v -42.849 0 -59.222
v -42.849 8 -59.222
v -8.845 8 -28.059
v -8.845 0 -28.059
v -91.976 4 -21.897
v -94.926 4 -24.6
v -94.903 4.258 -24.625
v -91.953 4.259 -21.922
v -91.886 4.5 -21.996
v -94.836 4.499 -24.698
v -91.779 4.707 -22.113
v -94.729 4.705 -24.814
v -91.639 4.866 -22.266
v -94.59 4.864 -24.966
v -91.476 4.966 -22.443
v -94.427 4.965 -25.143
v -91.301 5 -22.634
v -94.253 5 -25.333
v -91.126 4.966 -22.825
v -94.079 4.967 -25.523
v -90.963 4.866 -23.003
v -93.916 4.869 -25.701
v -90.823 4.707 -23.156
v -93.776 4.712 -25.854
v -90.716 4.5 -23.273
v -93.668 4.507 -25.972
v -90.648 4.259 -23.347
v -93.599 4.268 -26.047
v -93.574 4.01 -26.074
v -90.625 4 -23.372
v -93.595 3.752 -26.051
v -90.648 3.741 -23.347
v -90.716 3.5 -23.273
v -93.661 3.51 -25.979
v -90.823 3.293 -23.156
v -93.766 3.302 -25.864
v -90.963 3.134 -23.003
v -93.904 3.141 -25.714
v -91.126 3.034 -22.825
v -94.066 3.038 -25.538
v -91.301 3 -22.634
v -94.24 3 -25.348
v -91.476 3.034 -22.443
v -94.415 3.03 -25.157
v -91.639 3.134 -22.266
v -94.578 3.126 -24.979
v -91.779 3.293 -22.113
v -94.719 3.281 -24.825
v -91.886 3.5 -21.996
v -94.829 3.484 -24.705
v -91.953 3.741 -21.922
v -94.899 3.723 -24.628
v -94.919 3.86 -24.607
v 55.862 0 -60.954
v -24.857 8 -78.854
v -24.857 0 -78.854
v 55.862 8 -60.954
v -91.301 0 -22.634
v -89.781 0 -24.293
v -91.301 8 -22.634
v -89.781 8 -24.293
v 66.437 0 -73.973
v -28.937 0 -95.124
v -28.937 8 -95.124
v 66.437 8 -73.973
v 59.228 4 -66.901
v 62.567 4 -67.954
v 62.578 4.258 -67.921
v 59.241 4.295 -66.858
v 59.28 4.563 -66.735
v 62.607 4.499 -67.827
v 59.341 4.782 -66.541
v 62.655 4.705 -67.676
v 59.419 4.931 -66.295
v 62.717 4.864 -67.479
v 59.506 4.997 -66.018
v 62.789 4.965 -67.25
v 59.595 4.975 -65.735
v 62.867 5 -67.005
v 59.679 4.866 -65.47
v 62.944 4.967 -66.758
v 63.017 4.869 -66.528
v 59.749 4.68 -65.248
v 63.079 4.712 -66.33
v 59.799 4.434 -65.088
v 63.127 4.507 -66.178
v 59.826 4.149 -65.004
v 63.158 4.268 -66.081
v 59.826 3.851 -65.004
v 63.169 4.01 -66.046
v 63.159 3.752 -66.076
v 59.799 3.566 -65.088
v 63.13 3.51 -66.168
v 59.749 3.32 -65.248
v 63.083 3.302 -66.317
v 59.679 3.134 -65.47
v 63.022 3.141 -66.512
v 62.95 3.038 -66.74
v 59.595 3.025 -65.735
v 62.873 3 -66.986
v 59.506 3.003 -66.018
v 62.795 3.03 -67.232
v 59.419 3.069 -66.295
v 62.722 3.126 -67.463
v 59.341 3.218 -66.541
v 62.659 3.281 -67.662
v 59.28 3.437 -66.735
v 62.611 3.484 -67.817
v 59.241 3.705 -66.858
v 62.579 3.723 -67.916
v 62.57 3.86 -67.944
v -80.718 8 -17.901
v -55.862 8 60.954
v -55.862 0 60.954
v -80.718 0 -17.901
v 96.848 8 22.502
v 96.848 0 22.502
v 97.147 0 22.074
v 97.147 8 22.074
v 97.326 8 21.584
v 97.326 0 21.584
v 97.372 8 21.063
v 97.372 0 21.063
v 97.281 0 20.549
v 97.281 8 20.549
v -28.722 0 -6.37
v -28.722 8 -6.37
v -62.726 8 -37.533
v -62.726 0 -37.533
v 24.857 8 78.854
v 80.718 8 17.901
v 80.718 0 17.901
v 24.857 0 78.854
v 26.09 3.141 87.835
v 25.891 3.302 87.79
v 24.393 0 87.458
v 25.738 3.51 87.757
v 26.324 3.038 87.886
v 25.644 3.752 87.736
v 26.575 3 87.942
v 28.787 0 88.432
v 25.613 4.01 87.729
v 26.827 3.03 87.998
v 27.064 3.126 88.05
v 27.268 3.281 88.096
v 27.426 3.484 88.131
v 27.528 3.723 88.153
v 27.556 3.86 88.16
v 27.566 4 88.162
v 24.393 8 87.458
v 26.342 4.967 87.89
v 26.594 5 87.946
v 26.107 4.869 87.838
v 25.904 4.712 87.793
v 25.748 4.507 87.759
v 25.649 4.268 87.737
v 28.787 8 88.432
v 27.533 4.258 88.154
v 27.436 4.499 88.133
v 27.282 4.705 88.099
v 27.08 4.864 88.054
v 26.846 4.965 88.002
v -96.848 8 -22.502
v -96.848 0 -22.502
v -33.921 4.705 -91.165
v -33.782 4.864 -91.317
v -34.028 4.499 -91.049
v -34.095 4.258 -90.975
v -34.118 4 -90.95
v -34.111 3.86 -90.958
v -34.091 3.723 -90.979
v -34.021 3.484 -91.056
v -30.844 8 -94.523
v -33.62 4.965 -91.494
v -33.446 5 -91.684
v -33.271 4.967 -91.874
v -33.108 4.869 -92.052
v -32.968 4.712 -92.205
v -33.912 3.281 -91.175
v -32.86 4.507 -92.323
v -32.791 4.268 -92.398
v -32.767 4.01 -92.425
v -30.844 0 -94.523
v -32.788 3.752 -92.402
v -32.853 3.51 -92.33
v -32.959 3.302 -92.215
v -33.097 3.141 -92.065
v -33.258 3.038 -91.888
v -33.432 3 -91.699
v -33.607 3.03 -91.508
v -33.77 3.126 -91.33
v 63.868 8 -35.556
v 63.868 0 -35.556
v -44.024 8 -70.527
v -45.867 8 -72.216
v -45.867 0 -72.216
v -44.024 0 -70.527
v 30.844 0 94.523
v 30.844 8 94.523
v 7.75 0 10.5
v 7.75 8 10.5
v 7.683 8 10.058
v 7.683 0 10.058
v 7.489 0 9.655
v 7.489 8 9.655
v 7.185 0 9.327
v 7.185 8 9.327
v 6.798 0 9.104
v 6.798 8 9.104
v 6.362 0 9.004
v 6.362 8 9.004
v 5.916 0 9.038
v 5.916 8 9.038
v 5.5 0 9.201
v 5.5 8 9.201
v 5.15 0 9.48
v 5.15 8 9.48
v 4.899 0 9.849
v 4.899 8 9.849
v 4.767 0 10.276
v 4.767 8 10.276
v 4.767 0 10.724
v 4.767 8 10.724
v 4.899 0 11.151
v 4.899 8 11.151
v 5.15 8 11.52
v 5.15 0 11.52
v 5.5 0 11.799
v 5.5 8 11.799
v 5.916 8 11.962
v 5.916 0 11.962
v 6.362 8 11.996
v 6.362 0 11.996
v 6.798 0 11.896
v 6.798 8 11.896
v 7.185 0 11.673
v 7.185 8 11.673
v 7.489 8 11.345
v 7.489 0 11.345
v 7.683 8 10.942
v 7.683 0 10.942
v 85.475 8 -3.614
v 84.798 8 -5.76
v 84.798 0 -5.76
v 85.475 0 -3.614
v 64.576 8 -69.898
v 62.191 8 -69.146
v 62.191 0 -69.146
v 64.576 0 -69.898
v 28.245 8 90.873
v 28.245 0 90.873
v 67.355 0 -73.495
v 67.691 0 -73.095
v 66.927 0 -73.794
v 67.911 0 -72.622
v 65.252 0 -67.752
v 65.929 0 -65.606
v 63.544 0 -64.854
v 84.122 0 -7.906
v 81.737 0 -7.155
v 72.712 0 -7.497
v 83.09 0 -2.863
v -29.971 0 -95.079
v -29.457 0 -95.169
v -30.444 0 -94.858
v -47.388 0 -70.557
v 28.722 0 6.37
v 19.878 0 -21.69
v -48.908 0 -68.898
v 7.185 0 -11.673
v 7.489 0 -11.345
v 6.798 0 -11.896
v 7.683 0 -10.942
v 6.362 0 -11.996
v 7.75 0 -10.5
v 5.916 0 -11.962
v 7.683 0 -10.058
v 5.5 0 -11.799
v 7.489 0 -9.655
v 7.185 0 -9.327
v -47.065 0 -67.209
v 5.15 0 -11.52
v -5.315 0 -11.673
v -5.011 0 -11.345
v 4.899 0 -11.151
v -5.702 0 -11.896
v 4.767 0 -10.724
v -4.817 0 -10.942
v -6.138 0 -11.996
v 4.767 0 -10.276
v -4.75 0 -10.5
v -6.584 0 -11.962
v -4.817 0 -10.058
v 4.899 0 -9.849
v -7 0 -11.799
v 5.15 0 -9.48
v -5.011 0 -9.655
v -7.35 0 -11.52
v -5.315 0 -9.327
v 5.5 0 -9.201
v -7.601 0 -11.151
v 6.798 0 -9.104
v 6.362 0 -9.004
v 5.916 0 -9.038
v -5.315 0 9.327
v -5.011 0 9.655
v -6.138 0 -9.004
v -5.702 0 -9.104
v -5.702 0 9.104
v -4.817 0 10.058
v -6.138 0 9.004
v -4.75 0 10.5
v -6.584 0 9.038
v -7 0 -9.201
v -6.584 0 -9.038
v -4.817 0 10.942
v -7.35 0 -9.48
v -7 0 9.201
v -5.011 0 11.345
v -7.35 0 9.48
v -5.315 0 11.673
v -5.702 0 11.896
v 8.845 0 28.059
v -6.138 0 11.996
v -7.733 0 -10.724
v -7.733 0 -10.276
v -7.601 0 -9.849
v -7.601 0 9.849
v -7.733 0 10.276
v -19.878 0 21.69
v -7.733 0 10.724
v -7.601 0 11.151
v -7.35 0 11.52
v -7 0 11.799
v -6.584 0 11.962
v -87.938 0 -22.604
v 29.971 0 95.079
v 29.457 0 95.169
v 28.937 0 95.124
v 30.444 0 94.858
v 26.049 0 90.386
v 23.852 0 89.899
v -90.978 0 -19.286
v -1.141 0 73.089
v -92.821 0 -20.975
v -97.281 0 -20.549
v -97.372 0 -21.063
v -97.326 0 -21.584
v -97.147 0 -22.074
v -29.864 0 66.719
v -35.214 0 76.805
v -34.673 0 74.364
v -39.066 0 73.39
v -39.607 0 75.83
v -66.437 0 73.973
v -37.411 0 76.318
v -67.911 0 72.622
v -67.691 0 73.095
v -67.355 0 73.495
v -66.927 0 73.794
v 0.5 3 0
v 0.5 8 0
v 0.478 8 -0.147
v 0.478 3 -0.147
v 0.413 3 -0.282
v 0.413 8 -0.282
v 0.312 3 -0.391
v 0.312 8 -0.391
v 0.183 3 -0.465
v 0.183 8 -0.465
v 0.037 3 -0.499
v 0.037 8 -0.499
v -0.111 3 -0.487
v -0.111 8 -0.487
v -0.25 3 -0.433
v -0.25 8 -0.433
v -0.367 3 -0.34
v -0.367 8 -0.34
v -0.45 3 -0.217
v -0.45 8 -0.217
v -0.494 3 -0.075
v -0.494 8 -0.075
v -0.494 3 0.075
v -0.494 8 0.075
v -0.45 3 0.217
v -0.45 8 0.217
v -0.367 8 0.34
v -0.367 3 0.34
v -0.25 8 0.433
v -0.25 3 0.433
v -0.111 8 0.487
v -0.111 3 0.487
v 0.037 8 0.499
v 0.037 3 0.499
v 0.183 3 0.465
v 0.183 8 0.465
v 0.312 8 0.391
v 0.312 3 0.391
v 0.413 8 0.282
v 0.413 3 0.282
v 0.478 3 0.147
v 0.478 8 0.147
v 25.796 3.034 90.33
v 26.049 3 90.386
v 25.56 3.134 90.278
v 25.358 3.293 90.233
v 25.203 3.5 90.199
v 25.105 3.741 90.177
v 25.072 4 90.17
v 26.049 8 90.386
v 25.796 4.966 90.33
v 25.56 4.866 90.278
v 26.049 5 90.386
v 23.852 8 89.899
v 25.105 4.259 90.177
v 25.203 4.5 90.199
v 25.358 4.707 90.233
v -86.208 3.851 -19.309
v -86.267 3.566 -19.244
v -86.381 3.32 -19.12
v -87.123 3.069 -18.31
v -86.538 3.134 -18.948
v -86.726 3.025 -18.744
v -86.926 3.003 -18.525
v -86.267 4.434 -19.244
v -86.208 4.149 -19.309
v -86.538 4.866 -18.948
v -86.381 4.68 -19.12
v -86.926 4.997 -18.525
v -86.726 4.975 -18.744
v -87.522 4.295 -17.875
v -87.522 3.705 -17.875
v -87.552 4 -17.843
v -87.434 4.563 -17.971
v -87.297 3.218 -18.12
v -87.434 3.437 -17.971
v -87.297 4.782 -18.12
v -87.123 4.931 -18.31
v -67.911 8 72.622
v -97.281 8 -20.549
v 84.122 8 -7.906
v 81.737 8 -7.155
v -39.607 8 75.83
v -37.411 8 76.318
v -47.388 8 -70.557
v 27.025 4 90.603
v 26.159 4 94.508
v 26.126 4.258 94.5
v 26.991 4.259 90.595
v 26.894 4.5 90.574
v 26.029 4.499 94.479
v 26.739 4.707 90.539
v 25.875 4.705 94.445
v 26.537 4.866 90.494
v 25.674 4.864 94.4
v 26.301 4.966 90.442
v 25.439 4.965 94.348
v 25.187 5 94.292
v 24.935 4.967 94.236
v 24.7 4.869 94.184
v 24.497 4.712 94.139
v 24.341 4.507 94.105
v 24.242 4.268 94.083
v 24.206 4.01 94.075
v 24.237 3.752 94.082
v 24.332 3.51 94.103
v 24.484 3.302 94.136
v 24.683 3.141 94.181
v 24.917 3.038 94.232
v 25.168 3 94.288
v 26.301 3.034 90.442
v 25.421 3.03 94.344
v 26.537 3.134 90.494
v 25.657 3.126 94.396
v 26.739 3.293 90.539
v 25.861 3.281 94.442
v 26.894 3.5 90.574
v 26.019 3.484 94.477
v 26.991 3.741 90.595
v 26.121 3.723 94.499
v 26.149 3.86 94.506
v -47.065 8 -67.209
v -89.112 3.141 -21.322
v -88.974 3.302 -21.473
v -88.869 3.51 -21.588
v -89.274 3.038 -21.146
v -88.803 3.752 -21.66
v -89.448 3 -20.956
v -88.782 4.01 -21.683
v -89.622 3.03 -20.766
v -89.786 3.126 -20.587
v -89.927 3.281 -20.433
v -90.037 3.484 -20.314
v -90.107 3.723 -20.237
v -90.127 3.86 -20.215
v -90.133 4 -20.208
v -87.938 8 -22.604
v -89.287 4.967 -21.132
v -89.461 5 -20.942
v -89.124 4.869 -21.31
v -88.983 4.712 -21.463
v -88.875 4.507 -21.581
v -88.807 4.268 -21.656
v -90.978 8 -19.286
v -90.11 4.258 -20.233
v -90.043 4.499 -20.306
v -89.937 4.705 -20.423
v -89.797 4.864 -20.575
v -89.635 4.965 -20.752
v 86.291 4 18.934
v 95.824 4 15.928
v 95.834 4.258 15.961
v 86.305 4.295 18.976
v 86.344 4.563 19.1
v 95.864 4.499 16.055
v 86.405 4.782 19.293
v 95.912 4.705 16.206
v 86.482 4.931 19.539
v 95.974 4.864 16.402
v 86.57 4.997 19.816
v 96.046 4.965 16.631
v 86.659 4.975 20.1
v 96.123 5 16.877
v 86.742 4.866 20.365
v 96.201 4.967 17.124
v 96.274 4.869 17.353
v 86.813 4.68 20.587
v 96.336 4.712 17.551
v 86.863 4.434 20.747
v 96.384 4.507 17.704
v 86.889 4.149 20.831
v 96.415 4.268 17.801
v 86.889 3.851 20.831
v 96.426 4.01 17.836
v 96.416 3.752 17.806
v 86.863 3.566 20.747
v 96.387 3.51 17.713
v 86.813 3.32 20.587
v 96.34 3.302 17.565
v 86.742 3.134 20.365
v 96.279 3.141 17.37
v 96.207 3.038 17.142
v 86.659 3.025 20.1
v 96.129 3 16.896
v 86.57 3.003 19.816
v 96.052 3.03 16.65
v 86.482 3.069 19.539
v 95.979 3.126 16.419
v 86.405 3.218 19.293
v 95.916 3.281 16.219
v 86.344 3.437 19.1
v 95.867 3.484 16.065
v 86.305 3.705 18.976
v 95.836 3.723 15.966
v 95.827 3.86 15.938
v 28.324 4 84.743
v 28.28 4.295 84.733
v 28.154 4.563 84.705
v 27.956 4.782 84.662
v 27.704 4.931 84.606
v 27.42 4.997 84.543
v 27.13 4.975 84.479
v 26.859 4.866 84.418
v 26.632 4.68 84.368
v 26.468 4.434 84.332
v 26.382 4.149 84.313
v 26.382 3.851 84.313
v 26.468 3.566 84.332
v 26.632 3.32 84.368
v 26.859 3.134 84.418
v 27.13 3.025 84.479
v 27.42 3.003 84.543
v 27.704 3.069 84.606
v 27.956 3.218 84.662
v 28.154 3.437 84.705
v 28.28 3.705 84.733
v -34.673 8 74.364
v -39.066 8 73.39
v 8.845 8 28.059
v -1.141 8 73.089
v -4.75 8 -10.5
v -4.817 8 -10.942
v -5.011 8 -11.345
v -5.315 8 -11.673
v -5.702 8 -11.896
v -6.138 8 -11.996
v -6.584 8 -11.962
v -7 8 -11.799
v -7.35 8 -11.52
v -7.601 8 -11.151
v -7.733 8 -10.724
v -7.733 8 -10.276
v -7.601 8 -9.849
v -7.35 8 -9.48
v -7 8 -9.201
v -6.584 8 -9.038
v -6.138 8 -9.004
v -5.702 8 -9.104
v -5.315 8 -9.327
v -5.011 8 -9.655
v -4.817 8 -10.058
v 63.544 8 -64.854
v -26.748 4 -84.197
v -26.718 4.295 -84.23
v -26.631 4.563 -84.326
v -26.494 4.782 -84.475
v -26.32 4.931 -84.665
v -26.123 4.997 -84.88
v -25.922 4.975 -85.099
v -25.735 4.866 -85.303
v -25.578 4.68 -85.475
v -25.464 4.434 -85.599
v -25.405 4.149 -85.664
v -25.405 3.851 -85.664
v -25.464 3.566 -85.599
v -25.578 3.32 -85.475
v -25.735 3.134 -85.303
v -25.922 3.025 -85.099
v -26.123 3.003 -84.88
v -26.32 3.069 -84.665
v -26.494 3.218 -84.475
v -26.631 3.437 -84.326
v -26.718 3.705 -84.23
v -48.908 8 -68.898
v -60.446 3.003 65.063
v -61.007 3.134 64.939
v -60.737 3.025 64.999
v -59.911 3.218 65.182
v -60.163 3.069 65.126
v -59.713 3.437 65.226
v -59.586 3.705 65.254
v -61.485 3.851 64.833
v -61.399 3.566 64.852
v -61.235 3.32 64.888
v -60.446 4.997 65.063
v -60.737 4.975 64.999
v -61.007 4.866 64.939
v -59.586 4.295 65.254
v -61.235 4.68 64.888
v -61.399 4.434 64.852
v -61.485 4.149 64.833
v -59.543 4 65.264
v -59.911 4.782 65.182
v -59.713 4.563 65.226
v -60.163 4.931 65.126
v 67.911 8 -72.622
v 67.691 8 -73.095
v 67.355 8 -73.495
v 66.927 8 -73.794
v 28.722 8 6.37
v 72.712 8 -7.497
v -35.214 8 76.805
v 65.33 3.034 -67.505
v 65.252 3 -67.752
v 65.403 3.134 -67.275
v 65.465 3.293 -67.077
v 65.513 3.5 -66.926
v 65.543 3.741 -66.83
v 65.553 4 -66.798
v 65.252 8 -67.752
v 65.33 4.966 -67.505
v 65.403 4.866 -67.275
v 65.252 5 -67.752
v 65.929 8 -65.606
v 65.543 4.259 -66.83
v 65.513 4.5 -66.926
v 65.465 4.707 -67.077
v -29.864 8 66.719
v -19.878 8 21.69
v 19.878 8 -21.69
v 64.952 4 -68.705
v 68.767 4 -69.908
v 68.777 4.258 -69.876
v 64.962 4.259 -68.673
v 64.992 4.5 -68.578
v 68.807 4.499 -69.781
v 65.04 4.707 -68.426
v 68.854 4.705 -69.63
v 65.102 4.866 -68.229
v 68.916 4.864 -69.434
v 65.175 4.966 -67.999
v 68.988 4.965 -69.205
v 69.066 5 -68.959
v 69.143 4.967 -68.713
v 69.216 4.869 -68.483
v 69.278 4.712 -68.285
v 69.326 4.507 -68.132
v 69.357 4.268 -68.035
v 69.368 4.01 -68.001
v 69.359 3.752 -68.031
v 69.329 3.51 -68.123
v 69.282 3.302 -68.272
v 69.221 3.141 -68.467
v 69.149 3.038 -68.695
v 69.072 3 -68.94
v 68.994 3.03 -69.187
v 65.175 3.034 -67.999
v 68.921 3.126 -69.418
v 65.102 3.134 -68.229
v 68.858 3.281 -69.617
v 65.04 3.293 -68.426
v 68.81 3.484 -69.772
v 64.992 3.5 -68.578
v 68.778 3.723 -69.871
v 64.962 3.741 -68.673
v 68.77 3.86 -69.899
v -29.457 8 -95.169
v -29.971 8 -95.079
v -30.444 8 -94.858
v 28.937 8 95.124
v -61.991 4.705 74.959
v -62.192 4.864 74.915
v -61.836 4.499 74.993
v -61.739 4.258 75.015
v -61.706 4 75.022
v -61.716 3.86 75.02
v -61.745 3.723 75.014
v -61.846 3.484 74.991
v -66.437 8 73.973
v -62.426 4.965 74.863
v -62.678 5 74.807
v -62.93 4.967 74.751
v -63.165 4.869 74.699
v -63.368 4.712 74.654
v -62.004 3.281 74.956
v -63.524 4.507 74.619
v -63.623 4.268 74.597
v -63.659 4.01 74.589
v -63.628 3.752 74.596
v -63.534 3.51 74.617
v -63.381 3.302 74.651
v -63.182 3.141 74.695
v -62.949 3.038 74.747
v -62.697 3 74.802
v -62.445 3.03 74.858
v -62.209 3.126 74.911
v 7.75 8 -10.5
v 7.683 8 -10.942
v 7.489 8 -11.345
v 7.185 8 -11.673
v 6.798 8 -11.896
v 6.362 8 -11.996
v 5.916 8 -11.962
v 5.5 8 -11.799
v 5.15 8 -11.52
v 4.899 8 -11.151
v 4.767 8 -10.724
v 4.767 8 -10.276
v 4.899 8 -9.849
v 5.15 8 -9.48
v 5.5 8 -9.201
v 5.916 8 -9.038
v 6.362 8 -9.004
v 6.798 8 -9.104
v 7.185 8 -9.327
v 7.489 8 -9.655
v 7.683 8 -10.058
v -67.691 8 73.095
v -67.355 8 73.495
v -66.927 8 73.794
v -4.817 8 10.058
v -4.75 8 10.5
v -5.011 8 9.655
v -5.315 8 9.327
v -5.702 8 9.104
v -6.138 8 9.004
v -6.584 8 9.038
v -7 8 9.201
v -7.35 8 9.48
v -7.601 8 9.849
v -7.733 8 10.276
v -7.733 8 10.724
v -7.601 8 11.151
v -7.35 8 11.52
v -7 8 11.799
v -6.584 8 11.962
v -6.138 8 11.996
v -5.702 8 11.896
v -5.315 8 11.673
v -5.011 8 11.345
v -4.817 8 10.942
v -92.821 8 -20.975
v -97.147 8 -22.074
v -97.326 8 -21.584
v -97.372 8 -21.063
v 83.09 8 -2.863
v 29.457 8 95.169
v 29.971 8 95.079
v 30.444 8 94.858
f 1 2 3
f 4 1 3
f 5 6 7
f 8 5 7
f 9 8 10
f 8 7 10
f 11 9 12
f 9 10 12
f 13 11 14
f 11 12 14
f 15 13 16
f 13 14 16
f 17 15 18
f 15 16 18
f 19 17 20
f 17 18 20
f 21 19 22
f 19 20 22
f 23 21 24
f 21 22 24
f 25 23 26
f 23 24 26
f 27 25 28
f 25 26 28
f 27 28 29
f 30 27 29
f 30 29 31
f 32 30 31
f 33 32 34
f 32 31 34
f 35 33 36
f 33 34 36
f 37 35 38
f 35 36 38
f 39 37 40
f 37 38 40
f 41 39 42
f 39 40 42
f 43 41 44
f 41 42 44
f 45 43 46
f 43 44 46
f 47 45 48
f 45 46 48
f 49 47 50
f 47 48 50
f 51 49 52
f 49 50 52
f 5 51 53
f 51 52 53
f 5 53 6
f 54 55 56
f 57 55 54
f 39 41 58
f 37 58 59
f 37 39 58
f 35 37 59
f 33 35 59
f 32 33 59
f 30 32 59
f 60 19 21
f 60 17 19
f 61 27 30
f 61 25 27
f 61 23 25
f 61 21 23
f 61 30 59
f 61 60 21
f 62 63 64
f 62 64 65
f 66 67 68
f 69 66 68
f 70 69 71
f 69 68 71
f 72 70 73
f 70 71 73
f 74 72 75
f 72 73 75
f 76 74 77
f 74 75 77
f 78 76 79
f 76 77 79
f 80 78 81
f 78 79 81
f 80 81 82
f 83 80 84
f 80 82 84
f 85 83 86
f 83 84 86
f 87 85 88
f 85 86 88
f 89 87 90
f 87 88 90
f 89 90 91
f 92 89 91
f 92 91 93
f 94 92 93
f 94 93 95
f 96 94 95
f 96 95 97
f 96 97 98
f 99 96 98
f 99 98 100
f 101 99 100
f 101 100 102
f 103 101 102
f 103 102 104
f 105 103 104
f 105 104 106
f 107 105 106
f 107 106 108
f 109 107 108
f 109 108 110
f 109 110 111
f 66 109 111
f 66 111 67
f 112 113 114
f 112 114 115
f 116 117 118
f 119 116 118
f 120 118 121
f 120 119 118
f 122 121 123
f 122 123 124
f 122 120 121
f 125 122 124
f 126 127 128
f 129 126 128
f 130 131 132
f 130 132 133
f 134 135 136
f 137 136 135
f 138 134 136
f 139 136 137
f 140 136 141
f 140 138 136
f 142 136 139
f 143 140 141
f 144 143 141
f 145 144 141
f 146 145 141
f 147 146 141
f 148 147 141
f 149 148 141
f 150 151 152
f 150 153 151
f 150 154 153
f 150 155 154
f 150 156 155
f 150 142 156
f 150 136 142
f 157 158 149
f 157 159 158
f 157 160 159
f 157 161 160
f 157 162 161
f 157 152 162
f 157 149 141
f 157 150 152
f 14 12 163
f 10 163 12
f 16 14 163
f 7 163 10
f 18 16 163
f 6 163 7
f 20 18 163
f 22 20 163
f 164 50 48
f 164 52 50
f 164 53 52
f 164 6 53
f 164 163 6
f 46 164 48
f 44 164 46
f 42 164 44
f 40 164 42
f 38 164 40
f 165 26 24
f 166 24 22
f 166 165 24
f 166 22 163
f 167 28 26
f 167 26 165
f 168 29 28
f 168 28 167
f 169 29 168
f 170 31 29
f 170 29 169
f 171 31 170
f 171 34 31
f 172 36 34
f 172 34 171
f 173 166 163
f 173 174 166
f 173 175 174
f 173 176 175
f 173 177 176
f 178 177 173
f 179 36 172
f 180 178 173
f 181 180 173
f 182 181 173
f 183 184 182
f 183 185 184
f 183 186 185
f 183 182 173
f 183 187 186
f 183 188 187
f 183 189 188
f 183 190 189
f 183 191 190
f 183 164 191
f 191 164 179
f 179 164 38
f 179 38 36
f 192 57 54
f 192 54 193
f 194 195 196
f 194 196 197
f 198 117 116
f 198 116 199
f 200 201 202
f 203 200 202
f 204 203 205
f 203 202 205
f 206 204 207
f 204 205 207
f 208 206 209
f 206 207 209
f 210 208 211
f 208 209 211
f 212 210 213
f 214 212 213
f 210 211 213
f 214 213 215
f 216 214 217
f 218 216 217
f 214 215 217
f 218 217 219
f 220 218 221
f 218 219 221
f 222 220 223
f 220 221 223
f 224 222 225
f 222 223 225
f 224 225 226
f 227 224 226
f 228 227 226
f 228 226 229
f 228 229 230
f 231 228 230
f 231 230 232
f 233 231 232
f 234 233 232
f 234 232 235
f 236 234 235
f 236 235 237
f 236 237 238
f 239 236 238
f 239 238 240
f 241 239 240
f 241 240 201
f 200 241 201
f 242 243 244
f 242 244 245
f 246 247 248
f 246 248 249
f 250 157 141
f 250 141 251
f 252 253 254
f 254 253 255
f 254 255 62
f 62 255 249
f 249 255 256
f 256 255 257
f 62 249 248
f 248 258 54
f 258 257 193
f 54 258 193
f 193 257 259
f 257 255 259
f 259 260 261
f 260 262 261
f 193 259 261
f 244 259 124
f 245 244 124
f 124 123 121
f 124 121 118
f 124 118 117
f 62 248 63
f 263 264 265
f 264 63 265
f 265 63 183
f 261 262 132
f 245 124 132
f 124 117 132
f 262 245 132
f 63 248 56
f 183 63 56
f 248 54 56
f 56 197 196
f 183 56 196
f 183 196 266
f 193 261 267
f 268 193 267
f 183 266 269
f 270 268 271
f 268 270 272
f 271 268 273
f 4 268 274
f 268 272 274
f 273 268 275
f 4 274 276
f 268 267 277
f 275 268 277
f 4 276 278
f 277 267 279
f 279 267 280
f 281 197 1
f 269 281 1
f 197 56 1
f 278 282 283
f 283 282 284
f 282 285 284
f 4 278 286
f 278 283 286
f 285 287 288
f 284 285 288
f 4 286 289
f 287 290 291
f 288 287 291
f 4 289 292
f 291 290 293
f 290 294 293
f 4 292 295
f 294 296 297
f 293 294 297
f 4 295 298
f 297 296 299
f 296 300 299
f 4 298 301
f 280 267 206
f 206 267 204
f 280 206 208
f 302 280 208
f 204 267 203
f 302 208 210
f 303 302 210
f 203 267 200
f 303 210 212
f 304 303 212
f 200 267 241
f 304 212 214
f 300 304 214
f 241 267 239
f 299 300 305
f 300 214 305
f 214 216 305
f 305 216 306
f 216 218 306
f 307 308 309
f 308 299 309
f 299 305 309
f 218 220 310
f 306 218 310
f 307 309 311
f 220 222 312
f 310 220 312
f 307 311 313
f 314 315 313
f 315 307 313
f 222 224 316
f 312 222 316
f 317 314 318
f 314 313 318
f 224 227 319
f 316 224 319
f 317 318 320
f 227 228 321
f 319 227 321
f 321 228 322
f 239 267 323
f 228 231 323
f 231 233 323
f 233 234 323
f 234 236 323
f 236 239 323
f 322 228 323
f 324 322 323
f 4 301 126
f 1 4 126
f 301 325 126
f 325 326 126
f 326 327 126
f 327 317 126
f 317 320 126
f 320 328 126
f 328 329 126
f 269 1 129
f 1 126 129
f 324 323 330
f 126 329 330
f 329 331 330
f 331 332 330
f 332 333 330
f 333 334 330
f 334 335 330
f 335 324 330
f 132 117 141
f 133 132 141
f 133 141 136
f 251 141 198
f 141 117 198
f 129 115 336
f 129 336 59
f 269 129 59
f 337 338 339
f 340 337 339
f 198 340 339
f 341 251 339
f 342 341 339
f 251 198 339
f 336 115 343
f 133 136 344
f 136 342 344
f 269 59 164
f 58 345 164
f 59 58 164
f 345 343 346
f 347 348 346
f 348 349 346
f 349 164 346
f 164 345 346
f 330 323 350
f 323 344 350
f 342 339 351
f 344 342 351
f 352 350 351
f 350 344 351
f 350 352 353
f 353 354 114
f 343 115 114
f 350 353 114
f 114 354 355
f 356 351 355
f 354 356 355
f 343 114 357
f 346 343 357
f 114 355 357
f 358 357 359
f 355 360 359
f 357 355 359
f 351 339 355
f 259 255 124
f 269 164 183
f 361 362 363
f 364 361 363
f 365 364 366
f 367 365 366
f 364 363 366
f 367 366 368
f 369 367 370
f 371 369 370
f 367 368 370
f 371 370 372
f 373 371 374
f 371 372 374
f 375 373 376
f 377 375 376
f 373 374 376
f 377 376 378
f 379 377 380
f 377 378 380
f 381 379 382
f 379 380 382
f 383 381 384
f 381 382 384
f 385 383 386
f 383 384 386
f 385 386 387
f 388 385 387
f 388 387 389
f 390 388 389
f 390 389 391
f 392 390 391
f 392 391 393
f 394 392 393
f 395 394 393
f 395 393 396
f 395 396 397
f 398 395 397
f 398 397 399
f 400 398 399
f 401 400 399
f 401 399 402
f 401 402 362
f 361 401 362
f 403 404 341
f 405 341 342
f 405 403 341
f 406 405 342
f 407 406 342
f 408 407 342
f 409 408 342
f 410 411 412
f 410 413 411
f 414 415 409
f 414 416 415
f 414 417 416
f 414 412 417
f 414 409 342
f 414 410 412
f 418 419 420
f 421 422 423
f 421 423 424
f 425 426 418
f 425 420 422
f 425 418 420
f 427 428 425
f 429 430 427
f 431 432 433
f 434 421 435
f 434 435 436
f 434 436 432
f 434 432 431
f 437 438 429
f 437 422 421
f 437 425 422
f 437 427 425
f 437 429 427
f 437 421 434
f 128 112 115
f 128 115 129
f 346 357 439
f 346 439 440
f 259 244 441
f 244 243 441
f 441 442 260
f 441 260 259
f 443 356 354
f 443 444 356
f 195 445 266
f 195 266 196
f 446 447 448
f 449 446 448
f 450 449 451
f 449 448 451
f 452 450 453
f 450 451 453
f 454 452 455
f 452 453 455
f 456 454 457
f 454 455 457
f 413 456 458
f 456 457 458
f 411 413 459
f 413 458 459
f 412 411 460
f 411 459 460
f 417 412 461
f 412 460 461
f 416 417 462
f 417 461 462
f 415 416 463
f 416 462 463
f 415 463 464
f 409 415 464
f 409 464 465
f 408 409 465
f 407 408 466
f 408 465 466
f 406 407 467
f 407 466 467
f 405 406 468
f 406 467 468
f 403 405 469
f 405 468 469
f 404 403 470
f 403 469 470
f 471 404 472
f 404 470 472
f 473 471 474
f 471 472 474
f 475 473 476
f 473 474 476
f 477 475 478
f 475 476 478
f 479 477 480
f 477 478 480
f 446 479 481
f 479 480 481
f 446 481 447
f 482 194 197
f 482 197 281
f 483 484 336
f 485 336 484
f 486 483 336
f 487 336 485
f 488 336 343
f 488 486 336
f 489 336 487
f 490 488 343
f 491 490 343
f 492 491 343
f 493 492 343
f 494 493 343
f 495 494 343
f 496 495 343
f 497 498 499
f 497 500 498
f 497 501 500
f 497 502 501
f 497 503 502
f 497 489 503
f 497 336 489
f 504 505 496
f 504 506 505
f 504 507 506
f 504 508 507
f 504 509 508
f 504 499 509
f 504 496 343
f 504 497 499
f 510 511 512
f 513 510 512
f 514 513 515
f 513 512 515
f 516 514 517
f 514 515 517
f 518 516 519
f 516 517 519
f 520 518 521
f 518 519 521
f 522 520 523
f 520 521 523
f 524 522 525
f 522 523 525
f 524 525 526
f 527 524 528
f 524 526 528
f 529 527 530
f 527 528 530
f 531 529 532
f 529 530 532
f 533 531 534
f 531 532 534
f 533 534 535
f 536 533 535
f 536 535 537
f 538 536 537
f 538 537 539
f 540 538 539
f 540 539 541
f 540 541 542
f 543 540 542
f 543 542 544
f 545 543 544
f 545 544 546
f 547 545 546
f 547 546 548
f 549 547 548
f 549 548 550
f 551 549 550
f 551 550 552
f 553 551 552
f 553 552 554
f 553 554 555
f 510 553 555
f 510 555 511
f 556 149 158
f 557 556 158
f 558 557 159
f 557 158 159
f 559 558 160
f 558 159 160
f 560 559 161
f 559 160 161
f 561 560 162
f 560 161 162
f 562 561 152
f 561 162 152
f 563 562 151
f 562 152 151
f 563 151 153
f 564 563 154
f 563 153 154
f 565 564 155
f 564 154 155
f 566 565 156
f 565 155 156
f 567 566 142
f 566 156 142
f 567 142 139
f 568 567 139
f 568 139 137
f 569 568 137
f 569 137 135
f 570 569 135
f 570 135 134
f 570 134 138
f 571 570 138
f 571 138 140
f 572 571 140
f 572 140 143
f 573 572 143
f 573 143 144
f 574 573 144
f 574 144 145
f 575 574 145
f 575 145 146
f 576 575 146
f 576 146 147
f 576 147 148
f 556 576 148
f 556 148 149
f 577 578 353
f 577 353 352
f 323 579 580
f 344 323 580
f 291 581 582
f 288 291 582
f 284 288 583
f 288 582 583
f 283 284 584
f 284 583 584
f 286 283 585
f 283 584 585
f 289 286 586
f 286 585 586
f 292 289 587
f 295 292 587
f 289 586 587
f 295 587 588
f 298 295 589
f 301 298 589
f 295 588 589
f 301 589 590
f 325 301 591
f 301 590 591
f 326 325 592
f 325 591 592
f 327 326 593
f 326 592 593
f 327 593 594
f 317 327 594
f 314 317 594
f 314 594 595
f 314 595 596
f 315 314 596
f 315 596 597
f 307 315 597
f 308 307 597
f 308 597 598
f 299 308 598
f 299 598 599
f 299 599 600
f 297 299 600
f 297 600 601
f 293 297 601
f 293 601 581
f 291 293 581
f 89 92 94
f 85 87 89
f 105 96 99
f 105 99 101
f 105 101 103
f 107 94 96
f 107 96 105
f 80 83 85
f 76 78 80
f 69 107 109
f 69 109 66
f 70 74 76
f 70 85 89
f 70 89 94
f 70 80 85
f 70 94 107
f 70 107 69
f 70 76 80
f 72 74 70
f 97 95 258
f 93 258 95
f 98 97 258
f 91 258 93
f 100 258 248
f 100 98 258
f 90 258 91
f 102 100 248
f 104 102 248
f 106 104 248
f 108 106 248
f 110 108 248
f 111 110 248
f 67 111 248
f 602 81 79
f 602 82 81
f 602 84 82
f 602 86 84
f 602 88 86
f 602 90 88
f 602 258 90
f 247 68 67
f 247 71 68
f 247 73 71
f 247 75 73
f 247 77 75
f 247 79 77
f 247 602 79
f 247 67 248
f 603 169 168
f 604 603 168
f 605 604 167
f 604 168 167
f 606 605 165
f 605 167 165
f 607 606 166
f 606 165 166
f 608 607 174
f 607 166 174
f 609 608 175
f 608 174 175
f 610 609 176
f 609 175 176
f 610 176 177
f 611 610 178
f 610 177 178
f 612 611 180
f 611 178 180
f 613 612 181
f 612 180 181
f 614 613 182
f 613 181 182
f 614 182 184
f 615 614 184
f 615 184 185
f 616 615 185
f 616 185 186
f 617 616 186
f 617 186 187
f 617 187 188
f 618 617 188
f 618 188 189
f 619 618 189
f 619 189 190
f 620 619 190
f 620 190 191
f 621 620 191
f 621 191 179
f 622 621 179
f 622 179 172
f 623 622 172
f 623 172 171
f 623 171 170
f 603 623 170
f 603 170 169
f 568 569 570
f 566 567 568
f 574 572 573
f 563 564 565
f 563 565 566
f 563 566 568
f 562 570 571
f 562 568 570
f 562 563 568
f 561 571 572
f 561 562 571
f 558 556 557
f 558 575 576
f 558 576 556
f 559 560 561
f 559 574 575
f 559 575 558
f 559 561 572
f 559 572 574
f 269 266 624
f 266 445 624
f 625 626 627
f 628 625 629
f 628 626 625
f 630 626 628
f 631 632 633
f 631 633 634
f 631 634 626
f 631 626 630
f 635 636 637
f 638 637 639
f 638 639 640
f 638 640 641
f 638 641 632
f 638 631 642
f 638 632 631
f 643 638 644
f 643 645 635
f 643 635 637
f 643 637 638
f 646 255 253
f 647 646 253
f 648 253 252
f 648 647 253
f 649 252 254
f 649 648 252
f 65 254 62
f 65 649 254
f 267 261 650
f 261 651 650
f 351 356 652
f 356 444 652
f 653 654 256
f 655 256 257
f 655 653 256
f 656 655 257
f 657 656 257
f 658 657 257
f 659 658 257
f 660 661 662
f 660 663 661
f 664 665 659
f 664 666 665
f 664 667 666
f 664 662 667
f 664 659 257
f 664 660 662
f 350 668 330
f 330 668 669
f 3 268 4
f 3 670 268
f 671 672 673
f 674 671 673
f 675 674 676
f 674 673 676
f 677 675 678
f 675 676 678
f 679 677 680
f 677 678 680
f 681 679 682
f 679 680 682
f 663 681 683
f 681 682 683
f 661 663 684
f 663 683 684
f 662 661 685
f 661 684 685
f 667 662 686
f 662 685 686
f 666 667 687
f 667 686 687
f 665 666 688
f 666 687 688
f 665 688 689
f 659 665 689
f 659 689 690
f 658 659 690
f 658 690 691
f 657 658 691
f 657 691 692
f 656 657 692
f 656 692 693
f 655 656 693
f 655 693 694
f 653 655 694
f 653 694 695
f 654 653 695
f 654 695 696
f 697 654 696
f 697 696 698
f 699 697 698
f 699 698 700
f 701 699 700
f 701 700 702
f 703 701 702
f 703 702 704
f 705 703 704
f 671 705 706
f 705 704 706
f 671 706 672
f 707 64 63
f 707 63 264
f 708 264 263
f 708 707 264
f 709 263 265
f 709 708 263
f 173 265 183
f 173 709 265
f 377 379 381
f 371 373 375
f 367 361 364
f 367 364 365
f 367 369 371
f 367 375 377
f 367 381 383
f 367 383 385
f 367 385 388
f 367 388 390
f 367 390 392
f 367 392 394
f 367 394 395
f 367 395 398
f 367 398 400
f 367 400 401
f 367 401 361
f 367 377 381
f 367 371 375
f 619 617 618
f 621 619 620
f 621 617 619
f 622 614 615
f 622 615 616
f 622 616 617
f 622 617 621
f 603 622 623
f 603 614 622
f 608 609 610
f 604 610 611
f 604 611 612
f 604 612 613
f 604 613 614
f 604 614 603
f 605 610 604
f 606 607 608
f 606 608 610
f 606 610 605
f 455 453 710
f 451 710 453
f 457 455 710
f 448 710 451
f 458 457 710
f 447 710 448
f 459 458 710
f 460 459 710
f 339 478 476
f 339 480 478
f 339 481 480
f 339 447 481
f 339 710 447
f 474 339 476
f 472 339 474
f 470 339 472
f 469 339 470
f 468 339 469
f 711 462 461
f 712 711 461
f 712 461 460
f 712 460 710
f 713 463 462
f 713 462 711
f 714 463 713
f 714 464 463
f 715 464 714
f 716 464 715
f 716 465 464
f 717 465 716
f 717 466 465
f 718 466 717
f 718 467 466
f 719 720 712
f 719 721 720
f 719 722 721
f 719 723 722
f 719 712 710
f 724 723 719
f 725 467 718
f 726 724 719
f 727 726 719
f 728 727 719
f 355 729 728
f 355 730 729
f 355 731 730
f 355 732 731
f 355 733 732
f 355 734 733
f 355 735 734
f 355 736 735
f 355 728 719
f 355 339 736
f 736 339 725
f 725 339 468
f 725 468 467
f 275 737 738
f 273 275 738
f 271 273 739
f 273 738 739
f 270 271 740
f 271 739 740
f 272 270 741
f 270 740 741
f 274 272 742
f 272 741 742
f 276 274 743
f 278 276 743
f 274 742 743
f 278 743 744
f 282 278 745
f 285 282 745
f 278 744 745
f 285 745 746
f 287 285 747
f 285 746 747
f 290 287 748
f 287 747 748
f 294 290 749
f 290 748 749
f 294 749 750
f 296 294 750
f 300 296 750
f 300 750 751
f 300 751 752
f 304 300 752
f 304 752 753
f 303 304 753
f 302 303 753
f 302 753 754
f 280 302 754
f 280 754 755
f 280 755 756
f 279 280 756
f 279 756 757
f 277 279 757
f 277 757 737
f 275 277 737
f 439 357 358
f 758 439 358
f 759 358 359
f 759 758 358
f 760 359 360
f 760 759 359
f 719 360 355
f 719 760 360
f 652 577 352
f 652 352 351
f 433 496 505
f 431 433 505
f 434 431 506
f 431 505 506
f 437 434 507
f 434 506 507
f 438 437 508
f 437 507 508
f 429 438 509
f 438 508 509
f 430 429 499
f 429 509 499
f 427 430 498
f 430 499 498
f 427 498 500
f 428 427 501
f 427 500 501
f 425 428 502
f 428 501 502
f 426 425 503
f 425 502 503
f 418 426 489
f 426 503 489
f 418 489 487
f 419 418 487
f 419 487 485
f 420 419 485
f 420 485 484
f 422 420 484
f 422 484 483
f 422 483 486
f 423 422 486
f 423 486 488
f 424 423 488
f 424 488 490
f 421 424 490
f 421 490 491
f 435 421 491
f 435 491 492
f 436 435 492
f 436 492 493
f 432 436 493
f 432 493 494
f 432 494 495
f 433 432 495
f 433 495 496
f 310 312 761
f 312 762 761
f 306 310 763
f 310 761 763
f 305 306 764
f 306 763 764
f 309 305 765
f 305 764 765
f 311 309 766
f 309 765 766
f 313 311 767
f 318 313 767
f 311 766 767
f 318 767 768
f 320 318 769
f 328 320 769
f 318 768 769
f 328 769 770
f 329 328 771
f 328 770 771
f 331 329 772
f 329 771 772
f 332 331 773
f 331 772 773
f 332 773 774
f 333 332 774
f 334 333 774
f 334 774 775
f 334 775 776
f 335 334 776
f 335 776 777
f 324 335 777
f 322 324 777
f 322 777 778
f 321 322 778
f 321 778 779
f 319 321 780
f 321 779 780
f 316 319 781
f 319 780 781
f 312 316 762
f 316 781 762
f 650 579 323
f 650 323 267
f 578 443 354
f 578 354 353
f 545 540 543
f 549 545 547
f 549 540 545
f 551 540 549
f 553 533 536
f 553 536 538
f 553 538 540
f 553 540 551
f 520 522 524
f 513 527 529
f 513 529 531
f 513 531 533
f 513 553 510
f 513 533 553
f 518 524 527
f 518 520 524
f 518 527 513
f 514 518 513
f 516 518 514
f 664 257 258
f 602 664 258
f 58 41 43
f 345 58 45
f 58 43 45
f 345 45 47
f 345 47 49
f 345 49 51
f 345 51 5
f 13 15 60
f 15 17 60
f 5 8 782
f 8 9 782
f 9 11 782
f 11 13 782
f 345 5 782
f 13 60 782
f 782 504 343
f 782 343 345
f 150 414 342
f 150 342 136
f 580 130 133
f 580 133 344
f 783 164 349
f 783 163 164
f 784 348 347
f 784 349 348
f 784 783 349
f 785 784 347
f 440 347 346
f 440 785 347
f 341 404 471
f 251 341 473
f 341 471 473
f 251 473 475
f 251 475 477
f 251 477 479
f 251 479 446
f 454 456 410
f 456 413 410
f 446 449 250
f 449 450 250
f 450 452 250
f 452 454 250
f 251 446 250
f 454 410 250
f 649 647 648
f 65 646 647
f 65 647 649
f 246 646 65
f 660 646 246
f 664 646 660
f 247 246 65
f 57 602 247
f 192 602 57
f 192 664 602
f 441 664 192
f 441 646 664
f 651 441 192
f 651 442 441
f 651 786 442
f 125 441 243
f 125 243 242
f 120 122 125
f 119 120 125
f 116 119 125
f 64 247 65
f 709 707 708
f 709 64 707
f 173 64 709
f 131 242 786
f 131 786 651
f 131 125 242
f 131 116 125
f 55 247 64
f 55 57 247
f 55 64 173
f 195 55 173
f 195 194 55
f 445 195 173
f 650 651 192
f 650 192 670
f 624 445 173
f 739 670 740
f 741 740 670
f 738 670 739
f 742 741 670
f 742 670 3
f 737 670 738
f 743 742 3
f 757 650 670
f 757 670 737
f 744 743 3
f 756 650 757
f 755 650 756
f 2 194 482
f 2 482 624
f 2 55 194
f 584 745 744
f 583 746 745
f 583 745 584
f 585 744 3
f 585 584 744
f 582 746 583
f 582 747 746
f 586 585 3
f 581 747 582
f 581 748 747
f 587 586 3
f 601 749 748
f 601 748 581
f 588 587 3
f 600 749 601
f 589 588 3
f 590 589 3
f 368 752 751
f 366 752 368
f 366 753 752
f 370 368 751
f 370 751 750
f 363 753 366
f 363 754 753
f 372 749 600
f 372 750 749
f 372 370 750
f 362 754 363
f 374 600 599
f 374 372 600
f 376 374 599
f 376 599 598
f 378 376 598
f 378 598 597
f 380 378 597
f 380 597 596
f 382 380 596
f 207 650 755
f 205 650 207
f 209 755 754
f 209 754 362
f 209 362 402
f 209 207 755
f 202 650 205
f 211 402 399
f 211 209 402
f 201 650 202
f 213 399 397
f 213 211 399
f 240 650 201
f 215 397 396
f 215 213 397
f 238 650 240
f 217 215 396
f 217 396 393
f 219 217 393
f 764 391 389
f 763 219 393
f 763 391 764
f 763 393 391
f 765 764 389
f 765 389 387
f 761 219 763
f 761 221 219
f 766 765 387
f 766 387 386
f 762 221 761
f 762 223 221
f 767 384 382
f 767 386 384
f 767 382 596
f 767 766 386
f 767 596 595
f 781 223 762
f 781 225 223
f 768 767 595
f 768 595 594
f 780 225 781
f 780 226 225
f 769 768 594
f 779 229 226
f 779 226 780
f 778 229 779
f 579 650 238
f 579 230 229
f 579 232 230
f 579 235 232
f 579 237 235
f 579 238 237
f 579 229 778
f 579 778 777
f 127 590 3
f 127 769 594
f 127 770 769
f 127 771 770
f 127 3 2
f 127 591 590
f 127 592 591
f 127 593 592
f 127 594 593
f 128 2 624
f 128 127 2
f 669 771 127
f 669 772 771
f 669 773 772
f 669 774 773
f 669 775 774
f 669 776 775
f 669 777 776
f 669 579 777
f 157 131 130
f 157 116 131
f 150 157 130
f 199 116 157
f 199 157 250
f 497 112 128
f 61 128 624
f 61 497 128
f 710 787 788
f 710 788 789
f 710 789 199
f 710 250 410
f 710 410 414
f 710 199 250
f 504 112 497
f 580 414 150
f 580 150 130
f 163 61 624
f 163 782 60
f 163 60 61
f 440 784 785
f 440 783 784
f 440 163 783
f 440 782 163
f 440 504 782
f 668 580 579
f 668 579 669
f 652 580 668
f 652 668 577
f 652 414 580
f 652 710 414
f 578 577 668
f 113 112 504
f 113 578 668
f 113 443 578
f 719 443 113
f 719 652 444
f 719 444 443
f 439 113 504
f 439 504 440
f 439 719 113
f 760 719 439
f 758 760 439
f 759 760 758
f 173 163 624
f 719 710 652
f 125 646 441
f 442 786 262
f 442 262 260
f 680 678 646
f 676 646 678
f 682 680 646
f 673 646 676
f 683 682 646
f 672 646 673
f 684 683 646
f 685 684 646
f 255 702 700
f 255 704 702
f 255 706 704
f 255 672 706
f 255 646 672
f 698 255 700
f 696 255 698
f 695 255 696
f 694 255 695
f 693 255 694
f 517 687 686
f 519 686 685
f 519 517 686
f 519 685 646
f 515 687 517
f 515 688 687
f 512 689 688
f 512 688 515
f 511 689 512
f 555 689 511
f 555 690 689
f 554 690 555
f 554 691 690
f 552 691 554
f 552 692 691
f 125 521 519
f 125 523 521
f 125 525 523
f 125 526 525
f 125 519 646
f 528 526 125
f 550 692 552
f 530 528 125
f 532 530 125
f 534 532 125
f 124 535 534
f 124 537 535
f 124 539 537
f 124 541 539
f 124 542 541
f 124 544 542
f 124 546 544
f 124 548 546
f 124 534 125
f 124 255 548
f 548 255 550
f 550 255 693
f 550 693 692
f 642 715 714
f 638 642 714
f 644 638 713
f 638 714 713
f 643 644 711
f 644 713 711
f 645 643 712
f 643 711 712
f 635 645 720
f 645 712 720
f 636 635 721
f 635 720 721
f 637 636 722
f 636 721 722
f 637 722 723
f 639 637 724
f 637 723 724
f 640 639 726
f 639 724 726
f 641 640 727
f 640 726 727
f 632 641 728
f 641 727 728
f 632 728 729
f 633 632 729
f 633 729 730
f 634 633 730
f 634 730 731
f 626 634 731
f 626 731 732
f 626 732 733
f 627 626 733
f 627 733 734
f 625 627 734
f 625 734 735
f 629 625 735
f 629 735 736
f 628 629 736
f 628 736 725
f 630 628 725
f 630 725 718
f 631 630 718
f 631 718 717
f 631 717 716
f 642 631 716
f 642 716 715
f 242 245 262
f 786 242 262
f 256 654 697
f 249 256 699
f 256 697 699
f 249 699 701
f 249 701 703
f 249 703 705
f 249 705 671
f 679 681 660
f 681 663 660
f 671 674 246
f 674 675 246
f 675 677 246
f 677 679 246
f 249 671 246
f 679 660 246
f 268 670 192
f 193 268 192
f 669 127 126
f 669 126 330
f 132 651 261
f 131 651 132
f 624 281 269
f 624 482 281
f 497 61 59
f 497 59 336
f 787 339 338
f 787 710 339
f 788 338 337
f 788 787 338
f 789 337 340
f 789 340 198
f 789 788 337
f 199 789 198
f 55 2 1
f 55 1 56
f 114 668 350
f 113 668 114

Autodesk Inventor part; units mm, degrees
ref_plane "YZ Plane" through (0, 0, 0) normal (1, 0, 0) x (0, 1, 0)
ref_plane "XZ Plane" through (0, 0, 0) normal (0, 1, 0) x (-1, 0, 0)
ref_plane "XY Plane" through (0, 0, 0) normal (0, 0, 1) x (1, 0, 0)
sketch "Sketch1" plane through (0, 0, 0) normal (0, 1, 0) x (-1, 0, 0)
  line L0 (67.5641, 73.7231) -> (97.6281, -21.6506)
  line L1 (97.6281, -21.6506) -> (30.0641, -95.3738)
  line L2 (30.0641, -95.3738) -> (-67.5641, -73.7231)
  line L3 (-67.5641, -73.7231) -> (-97.6281, 21.6506)
  line L4 (-97.6281, 21.6506) -> (-30.0641, 95.3738)
  line L5 (-30.0641, 95.3738) -> (67.5641, 73.7231)
  point P0 (0, 0)
  point P1 (0, 0)
  dimension "d0" = 100
  dimension "d17" = 21.6506
extrude "Extrusion1" add sketch "Sketch1" along normal blind 8
sketch "Sketch2" plane through (67.5641, 0, -73.7231) normal (0.9537, 0, -0.3006) x (-0.3006, 0, -0.9537)
  line L0 (0, 0) -> (0, 8) projected
  line L1 (0, 4) -> (-5, 4)
  line L2 (-100, 0) -> (-100, 8) projected
  line L3 (-100, 4) -> (-95, 4)
  circle A0 centre (-95, 4) radius 1
  circle A1 centre (-5, 4) radius 1
  point P0 (-50, 0)
  dimension "d4" = 5
  dimension "d5" = 5
  dimension "d6" = 2
  dimension "d7" = 2
extrude "Extrusion2" cut sketch "Sketch2" against normal blind 10
sketch "Sketch3" plane through (0, 8, 0) normal (0, 1, 0) x (1, 0, 0)
  circle A0 centre (0, 0) radius 0.5
  dimension "d10" = 1
extrude "Extrusion3" cut sketch "Sketch3" against normal blind 5
pattern_circular "Circular Pattern1" count 3 over 360 about axis through (0, 8, 0) along (0, -1, 0) of "Extrusion2"
sketch "Sketch4" plane through (0, 8, 0) normal (0, 1, 0) x (1, 0, 0)
  line L0 (0, 0) -> (0, 10.5)
  line L1 (0, 10.5) -> (-6.25, 10.5)
  circle A0 centre (-6.25, 10.5) radius 1.5
  circle A1 centre (6.25, 10.5) radius 1.5
  circle A2 centre (-6.25, -10.5) radius 1.5
  circle A3 centre (6.25, -10.5) radius 1.5
  dimension "d18" = 10.5
  dimension "d19" = 6.25
  dimension "d20" = 3
  dimension "d23" = 12.5
  dimension "d26" = 21
extrude "Extrusion4" cut sketch "Sketch4" against normal blind 8
sketch "Sketch5" plane through (0, 8, 0) normal (0, 1, 0) x (1, 0, 0)
  line L0 (-67.5641, -73.7231) -> (30.0641, -95.3738) projected
  line L1 (30.0641, -95.3738) -> (25.1827, -94.2912)
  line L2 (25.1827, -94.2912) -> (26.0487, -90.3861)
  line L3 (26.0487, -90.3861) -> (23.852, -89.899)
  line L4 (26.0487, -90.3861) -> (28.2453, -90.8732)
  line L5 (23.852, -89.899) -> (24.3933, -87.4583)
  line L6 (24.3933, -87.4583) -> (28.7866, -88.4325)
  line L7 (28.7866, -88.4325) -> (28.2453, -90.8732)
  point P0 (0, 0)
  dimension "d31" = 5
  dimension "d32" = 4
  dimension "d33" = 2.25
  dimension "d34" = 90
  dimension "d35" = 2.25
  dimension "d36" = 90
  dimension "d37" = 2.5
  dimension "d38" = 90
  dimension "d39" = 90
extrude "Extrusion5" cut sketch "Sketch5" against normal blind 8
pattern_linear "Rectangular Pattern1" count 2 spacing 65 along (-0.9763, 0, -0.2165) of "Extrusion5"
pattern_circular "Circular Pattern2" count 3 over 360 about axis through (0, 8, 0) along (0, -1, 0) of "Extrusion5", "Rectangular Pattern1"
sketch "Sketch6" plane through (0, 8, 0) normal (0, 1, 0) x (1, 0, 0)
  line L0 (-97.6281, 21.6506) -> (-30.0641, 95.3738) projected
  line L1 (-97.6281, 21.6506) -> (-30.0641, 95.3738)
  line L2 (-30.0641, 95.3738) -> (67.5641, 73.7231) projected
  line L3 (-30.0641, 95.3738) -> (67.5641, 73.7231)
  line L4 (67.5641, 73.7231) -> (97.6281, -21.6506) projected
  line L5 (67.5641, 73.7231) -> (97.6281, -21.6506)
  line L6 (97.6281, -21.6506) -> (30.0641, -95.3738) projected
  line L7 (97.6281, -21.6506) -> (30.0641, -95.3738)
  line L8 (30.0641, -95.3738) -> (-67.5641, -73.7231)
  line L9 (-61.7064, -75.0222) -> (-63.6589, -74.5891) projected
  line L10 (-67.5641, -73.7231) -> (-97.6281, 21.6506)
  line L11 (-80.7184, 17.9006) -> (-24.8568, 78.8545)
  line L12 (-24.8568, 78.8545) -> (55.8616, 60.9539)
  line L13 (55.8616, 60.9539) -> (80.7184, -17.9006)
  line L14 (80.7184, -17.9006) -> (24.8568, -78.8545)
  line L15 (24.8568, -78.8545) -> (-55.8616, -60.9539)
  line L16 (-55.8616, -60.9539) -> (-80.7184, 17.9006)
  line L17 (0, 0) -> (30, 0) construction
  line L18 (8.8449, -28.0592) -> (28.7224, -6.3697)
  line L19 (28.7224, -6.3697) -> (19.8775, 21.6895)
  line L20 (19.8775, 21.6895) -> (-8.8449, 28.0592)
  line L21 (-8.8449, 28.0592) -> (-28.7224, 6.3697)
  line L22 (-28.7224, 6.3697) -> (-19.8775, -21.6895)
  line L23 (-19.8775, -21.6895) -> (8.8449, -28.0592)
  line L24 (28.7224, -6.3697) -> (19.8775, 21.6895)
  line L25 (-8.8449, 28.0592) -> (-28.7224, 6.3697)
  line L26 (-19.8775, -21.6895) -> (8.8449, -28.0592)
  line L27 (0, 0) -> (8.8449, -28.0592)
  line L28 (-8.8449, 28.0592) -> (-28.7224, 6.3697)
  line L29 (-28.7224, 6.3697) -> (-62.7264, 37.5328)
  line L30 (-62.7264, 37.5328) -> (-42.8489, 59.2223)
  line L31 (-42.8489, 59.2223) -> (-8.8449, 28.0592)
  line L32 (-19.8775, -21.6895) -> (8.8449, -28.0592)
  line L33 (8.8449, -28.0592) -> (-1.1412, -73.089)
  line L34 (-1.1412, -73.089) -> (-29.8636, -66.7194)
  line L35 (-29.8636, -66.7194) -> (-19.8775, -21.6895)
  line L36 (28.7224, -6.3697) -> (19.8775, 21.6895)
  line L37 (19.8775, 21.6895) -> (63.8676, 35.5562)
  line L38 (63.8676, 35.5562) -> (72.7125, 7.497)
  line L39 (72.7125, 7.497) -> (28.7224, -6.3697)
  dimension "d50" = 15
  dimension "d53" = 28.7224
fillet "Fillet2" radius 2 6 edges at (-97.6281, 4, -21.6506) (-67.5641, 4, 73.7231) (30.0641, 4, 95.3738) (97.6281, 4, 21.6506) (67.5641, 4, -73.7231) (-30.0641, 4, -95.3738)
extrude "Extrusion7" cut sketch "Sketch6" against normal blind 10 contours L11 L29 L22 L35 L15 L16 | L11 L12 L13 L37 L20 L31 | L33 L18 L39 L13 L14 L15
properties part number "Hex_Servo_Top"
